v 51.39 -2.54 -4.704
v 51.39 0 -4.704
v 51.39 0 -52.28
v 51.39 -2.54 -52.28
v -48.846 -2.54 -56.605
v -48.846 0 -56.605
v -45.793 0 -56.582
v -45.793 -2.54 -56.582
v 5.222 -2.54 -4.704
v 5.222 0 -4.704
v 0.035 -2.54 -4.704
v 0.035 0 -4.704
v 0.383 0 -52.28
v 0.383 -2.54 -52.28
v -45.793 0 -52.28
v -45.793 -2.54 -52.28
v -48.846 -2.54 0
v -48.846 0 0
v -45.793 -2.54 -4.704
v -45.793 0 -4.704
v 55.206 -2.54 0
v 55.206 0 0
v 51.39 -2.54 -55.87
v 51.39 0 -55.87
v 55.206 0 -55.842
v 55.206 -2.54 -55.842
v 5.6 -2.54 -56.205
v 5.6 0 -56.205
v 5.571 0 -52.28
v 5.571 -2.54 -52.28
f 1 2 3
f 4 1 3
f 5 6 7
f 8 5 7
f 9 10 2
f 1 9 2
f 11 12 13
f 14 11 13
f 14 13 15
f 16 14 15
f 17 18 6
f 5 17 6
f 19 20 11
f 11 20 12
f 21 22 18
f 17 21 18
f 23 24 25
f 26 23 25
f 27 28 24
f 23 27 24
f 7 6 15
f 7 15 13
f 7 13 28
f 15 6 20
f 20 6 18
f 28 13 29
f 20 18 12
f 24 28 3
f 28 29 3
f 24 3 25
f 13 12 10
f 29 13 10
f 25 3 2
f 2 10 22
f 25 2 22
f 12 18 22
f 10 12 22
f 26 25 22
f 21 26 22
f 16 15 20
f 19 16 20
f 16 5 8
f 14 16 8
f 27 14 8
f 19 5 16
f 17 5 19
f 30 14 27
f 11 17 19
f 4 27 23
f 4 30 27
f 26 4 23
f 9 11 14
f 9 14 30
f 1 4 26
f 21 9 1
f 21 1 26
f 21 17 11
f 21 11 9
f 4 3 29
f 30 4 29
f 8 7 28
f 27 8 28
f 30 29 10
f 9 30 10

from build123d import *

# Parameters (mm, degrees)
F1_DEPTH = 2.54


# Not quite as in the source:
# - a feature names something its author has since deleted; it is built from what else it names


with BuildPart() as f1:
    # F0 (on Front) → F1 (new body)
    with BuildSketch(Plane.XZ):
        Polygon((-45.7926876843, 0), (-48.8455332816, 0), (-48.8455332816, -56.6048510373), (-45.7926876843, -56.5824585276), (-45.7926876843, -52.2799864411), (-45.7926876843, -32.4403391187), (-45.7926876843, -28.3024255186), (-45.7926876843, -4.7043516129), align=None)
        Polygon((0, 0), (-45.7926876843, 0), (-45.7926876843, -4.7043516129), (0.0345062453, -4.7043516129), align=None)
        Polygon((-45.7926876843, -52.2799864411), (-45.7926876843, -56.5824585276), (5.5995524852, -56.2054983442), (5.5707590003, -52.2799864411), (0.3834717695, -52.2799864411), align=None)
        Polygon((5.1872872309, 0), (0, 0), (0.0345062453, -4.7043516129), (5.2217934762, -4.7043516129), align=None)
        Polygon((5.5707590003, -52.2799864411), (5.5995524852, -56.2054983442), (51.3895750046, -55.8696302204), (51.3895750046, -52.2799864411), align=None)
        Polygon((51.3895750046, 0), (5.1872872309, 0), (5.2217934762, -4.7043516129), (51.3895750046, -4.7043516129), align=None)
        Polygon((51.3895750046, -52.2799864411), (51.3895750046, -55.8696302204), (55.2056245506, -55.8416396379), (55.2056245506, 0), (51.3895750046, 0), (51.3895750046, -4.7043516129), (51.3895750046, -28.3024255186), align=None)
        Polygon((5.2217934762, -4.7043516129), (0.0345062453, -4.7043516129), (0.2379486892, -32.4403391187), (0.3834717695, -52.2799864411), (5.5707590003, -52.2799864411), align=None)
    extrude(amount=F1_DEPTH)


solid = f1.part
